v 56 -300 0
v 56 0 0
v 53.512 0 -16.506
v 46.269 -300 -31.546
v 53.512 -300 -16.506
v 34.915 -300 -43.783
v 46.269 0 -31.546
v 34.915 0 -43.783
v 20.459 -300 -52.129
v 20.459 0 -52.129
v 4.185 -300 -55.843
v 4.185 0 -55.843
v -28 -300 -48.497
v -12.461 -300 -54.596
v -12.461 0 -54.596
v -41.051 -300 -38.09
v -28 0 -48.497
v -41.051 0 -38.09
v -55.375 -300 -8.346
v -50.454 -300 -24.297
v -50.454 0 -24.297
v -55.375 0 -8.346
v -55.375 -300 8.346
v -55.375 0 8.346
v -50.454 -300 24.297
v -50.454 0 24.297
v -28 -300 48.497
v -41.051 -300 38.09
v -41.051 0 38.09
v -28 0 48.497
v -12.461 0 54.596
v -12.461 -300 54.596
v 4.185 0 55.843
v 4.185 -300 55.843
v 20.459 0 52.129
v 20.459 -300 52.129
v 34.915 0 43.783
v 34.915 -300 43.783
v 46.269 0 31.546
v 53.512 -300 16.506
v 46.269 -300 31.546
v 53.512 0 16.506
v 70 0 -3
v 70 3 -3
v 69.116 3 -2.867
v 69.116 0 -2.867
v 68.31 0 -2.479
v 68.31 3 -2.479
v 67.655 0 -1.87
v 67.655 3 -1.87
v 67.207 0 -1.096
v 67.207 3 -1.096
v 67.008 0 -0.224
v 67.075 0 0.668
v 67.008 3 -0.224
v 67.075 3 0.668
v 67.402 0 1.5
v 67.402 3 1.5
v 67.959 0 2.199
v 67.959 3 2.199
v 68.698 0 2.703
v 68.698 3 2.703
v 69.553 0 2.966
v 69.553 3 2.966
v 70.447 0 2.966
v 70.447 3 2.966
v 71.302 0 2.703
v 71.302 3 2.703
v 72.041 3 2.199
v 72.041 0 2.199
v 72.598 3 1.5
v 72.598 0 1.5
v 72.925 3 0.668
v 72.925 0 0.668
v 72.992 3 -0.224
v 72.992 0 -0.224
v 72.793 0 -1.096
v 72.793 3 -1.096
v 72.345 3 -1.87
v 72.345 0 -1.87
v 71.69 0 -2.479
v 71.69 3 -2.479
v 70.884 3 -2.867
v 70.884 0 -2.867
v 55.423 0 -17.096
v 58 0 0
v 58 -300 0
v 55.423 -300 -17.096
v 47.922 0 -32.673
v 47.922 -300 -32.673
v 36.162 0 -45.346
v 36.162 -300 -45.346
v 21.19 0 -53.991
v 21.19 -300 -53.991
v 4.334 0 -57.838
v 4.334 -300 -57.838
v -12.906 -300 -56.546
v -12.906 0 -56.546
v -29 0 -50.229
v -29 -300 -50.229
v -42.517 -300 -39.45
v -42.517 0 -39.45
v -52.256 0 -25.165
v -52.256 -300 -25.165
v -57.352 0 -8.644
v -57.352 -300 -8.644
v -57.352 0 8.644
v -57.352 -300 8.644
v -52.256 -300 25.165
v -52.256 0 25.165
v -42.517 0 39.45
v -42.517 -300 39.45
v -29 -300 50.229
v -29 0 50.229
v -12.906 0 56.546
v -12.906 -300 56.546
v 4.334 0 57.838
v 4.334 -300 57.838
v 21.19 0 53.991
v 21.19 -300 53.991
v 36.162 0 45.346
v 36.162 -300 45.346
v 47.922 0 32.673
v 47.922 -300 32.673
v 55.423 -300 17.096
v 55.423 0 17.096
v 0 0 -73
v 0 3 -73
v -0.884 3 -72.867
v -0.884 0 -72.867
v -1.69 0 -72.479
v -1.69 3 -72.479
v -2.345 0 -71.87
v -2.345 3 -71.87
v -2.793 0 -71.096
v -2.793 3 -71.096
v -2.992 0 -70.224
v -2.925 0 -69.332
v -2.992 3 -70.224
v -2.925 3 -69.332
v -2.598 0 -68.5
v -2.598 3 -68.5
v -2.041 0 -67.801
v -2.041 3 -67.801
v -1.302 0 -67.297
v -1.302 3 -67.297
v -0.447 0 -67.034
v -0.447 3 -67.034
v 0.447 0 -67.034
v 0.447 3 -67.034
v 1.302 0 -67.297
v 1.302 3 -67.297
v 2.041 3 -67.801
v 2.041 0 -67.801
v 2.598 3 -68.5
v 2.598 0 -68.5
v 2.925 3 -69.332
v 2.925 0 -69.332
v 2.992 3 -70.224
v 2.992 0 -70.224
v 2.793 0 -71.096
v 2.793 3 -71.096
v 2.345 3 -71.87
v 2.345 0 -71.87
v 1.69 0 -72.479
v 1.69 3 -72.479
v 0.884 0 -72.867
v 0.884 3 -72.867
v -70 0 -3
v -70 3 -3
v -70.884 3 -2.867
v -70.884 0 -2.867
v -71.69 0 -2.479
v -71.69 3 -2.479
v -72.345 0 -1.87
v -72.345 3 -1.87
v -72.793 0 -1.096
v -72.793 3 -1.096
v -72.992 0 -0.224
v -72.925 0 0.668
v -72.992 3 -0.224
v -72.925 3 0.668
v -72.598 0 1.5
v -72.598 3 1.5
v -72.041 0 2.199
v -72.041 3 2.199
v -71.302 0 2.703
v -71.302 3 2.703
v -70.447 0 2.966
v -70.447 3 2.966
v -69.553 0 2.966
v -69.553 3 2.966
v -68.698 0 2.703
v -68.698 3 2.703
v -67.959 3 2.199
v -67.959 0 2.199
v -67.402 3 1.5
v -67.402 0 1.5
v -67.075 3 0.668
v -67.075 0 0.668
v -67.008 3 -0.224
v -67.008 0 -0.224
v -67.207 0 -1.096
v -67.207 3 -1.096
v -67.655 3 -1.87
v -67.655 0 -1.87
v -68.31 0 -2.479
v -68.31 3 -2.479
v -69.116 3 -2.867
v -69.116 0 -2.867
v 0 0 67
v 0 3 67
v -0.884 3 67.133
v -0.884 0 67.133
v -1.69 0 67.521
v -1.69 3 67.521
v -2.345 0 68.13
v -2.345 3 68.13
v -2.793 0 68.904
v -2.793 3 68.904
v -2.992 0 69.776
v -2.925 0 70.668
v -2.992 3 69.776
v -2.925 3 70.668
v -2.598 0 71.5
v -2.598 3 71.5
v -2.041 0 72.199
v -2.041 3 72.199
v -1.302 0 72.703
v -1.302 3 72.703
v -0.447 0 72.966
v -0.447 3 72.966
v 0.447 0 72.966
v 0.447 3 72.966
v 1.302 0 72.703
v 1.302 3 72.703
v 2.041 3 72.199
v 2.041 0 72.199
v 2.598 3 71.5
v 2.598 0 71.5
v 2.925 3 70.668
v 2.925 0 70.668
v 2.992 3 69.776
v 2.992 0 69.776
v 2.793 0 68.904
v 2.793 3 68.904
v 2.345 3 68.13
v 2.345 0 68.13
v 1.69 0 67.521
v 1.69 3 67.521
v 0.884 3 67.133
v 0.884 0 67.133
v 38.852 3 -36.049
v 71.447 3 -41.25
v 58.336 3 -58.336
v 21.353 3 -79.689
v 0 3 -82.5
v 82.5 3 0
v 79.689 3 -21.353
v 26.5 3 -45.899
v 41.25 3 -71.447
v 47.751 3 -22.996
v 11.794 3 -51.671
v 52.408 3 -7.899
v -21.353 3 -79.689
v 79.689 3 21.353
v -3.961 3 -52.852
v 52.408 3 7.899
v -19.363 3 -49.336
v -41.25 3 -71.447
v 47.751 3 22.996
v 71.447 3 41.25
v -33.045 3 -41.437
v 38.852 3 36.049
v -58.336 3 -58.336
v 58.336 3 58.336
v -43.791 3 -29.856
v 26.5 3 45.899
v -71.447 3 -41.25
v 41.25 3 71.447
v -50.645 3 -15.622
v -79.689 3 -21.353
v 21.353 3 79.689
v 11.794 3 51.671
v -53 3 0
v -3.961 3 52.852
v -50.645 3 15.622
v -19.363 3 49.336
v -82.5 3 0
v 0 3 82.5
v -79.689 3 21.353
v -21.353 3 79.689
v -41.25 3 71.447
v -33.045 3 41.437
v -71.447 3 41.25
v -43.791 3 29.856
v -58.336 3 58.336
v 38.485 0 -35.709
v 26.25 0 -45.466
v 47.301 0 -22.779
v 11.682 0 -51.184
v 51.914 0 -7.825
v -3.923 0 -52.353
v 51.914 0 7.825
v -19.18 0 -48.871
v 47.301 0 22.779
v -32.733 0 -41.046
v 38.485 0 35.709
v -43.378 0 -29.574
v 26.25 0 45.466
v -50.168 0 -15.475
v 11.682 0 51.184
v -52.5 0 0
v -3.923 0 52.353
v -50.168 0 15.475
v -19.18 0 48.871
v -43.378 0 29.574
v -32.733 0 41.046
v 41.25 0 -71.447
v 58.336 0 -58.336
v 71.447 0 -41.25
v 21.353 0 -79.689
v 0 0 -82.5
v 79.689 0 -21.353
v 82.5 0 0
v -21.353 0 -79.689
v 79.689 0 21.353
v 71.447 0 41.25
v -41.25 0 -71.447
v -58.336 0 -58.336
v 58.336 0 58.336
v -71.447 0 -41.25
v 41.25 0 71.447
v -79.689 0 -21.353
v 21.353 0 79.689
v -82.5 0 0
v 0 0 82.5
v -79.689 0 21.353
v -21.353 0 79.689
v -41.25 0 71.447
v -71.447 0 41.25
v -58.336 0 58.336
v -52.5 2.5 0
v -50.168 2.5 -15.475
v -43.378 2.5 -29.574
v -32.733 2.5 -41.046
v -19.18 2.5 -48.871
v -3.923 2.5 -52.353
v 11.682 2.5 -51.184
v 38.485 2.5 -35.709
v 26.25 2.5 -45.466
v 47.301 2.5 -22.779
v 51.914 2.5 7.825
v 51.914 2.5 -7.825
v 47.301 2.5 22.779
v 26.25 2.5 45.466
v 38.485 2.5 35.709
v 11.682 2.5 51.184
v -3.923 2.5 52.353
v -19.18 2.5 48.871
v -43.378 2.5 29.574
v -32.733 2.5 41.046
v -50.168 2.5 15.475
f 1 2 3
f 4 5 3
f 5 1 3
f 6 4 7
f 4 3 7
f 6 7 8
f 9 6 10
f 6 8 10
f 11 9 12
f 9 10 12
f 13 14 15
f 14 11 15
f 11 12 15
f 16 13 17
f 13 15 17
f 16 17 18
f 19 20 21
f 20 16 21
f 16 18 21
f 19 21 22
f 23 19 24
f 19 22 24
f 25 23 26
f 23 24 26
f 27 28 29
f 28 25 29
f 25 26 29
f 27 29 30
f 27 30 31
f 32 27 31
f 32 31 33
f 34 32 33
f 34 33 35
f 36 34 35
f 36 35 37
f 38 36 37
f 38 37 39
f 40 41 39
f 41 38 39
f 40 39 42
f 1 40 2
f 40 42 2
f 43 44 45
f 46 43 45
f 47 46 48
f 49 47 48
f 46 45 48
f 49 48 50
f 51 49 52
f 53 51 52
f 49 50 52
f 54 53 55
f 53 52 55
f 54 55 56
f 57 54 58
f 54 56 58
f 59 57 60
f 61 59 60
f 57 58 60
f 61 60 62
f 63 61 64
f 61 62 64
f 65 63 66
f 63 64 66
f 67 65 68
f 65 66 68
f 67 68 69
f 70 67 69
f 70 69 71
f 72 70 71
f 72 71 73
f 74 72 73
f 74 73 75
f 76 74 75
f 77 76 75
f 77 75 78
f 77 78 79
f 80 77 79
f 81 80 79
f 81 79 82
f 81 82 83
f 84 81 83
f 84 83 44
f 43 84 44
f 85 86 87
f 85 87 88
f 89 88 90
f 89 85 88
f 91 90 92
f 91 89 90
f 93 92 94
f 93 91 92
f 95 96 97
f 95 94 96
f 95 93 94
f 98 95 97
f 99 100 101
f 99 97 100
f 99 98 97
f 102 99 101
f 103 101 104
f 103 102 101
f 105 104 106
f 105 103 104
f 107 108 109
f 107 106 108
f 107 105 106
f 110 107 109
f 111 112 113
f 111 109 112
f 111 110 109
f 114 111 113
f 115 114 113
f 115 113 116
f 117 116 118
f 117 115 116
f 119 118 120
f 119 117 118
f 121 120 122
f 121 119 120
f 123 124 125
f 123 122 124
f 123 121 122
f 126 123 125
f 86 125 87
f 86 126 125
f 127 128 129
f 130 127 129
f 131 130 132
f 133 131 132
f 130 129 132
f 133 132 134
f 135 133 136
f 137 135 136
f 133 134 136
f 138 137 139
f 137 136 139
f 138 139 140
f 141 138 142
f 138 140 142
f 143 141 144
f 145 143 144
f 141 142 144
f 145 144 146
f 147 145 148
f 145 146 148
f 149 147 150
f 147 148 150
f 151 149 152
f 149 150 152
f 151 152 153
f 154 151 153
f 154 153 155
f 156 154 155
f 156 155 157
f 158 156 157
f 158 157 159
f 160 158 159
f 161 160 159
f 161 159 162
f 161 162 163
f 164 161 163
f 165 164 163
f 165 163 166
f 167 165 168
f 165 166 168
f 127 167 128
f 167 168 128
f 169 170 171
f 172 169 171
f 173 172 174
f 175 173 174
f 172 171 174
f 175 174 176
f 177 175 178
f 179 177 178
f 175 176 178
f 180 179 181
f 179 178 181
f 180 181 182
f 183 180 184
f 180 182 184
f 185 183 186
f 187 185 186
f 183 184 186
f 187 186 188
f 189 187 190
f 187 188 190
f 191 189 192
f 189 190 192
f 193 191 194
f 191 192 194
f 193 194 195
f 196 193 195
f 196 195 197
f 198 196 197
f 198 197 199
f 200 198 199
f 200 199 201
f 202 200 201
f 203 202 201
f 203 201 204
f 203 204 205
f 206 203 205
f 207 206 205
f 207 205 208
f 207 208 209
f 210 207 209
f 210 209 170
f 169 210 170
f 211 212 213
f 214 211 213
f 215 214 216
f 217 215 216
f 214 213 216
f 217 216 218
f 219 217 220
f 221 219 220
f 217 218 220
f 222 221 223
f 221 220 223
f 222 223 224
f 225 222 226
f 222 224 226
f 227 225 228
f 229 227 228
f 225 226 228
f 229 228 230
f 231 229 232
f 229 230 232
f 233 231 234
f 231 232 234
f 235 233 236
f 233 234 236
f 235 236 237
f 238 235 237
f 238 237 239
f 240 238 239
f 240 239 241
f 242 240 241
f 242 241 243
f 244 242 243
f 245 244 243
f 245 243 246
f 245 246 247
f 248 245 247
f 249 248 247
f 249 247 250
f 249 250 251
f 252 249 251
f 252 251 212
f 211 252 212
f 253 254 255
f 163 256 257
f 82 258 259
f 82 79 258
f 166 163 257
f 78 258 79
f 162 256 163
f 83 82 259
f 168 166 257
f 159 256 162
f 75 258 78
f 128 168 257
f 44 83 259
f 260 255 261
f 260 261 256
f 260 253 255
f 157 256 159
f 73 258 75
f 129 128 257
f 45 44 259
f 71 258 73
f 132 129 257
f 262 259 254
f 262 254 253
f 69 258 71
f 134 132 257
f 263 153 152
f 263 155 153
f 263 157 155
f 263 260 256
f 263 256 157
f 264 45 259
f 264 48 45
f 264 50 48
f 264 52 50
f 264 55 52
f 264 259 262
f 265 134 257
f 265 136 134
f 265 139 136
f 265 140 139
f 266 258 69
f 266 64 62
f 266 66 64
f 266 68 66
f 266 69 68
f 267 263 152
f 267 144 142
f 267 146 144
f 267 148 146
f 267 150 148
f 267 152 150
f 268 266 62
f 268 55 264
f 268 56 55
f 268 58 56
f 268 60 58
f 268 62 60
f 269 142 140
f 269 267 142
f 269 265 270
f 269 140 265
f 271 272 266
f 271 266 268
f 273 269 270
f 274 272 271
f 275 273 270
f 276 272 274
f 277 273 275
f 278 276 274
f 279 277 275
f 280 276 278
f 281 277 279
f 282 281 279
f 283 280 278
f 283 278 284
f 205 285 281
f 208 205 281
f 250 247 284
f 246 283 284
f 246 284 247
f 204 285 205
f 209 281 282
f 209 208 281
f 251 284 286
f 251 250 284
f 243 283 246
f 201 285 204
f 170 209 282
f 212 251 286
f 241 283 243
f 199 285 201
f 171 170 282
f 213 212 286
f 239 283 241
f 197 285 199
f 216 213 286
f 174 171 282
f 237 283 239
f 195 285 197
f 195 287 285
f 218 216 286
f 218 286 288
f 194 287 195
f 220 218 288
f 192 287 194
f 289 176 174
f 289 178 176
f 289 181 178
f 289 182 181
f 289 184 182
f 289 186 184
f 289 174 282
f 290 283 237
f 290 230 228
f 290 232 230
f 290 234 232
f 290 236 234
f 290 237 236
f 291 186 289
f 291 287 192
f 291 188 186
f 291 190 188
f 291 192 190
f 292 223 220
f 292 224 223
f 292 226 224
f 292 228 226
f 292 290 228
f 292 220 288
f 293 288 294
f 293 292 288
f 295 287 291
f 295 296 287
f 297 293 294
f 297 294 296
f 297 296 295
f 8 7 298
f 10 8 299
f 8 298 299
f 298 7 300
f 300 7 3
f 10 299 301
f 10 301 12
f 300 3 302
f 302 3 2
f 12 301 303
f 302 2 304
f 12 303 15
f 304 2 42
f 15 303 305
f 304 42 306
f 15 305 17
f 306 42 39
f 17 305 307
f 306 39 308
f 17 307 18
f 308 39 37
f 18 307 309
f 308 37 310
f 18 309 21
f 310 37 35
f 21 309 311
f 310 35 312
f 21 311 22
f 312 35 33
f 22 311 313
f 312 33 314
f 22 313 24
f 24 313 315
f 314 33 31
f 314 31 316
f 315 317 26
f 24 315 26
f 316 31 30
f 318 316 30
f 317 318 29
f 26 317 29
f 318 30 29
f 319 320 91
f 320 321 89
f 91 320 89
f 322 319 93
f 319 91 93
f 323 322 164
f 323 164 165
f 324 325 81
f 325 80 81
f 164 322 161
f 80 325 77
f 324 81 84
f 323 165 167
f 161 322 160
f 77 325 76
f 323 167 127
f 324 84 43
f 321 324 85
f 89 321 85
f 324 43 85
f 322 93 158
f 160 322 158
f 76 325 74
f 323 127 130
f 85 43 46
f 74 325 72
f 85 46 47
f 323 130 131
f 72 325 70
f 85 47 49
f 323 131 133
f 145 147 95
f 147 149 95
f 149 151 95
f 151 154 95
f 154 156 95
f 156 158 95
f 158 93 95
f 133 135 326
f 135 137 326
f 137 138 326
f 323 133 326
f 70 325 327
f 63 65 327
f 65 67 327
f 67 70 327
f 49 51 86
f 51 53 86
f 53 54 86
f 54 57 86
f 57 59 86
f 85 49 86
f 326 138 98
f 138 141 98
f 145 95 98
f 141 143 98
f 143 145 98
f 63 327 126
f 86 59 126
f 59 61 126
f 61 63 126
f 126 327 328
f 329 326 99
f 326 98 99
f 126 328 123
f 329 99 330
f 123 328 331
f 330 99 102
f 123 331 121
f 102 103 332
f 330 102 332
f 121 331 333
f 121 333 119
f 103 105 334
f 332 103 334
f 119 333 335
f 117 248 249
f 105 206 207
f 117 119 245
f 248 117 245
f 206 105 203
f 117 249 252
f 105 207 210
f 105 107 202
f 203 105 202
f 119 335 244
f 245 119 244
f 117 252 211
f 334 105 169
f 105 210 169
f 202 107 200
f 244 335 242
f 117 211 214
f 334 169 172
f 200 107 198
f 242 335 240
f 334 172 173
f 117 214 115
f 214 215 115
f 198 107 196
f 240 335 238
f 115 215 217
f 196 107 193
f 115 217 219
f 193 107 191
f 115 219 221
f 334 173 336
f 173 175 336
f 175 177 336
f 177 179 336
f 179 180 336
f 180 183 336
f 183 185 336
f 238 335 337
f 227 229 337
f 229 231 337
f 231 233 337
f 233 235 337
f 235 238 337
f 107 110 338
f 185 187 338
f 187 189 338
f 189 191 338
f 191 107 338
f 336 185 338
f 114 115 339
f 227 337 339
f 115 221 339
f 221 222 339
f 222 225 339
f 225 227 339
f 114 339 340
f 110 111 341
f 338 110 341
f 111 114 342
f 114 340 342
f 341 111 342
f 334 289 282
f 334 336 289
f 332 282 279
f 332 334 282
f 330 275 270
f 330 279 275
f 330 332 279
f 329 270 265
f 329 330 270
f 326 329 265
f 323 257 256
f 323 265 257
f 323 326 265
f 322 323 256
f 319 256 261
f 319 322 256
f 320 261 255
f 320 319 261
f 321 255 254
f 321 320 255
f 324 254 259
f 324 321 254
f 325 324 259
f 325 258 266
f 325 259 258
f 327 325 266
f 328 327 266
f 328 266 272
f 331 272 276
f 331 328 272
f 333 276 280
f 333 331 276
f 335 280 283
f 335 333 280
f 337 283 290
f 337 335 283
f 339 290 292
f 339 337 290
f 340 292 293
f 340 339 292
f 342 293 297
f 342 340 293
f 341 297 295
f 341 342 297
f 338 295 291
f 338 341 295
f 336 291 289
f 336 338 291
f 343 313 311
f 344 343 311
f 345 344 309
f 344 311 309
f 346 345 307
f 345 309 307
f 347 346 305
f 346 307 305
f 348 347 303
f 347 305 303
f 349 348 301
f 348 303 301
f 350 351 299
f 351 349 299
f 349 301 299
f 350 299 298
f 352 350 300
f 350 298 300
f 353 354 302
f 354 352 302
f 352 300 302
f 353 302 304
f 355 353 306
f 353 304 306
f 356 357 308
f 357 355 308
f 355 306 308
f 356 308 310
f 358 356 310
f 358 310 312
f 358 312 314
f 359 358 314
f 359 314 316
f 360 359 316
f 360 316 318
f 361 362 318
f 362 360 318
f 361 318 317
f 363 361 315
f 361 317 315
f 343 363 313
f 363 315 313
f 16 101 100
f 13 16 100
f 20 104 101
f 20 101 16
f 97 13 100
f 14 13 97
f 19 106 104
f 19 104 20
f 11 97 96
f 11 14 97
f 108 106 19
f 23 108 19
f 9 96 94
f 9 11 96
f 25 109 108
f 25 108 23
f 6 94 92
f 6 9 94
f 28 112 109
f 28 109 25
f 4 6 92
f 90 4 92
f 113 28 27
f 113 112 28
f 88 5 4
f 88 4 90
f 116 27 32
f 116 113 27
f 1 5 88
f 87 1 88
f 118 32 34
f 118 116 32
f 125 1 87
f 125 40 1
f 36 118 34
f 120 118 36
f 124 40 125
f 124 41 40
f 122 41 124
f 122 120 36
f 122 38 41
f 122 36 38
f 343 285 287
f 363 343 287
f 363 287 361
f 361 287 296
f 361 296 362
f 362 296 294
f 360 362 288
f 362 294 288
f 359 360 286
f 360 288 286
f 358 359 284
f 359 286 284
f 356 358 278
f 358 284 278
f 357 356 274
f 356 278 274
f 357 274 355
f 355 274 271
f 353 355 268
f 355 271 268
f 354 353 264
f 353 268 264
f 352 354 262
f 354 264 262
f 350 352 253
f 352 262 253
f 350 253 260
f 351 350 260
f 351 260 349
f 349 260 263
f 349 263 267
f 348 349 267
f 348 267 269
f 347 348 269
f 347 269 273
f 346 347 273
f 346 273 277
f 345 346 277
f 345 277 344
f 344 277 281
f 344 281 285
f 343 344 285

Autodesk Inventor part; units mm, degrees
ref_plane "YZ Plane" through (0, 0, 0) normal (1, 0, 0) x (0, 1, 0)
ref_plane "XZ Plane" through (0, 0, 0) normal (0, 1, 0) x (-1, 0, 0)
ref_plane "XY Plane" through (0, 0, 0) normal (0, 0, 1) x (1, 0, 0)
sketch "Sketch1" plane through (0, 0, 0) normal (0, 1, 0) x (-1, 0, 0)
  circle A0 centre (0, 0) radius 52.5
  circle A1 centre (0, 0) radius 82.5
  dimension "d1" = 105
  dimension "d2" = 30
extrude "Extrusion1" add sketch "Sketch1" along normal blind 3
chamfer "Chamfer1" distance 0.5 angle 45 1 edges at (52.5, 3, 0)
sketch "Sketch4" plane through (0, 0, 0) normal (0, -1, 0) x (1, 0, 0)
  circle A0 centre (0, 0) radius 70 construction
  circle A1 centre (0, 70) radius 3
  circle A2 centre (-70, 0) radius 3
  circle A3 centre (0, -70) radius 3
  circle A4 centre (70, 0) radius 3
  dimension "d14" = 140
  dimension "d15" = 6
  dimension "d18" = 360
hole "Hole1" at (0, 0, 70) at (70, 0, 0) at (0, 0, -70) at (-70, 0, 0) direction (0, 1, 0) diameter 6 end through all
sketch "Sketch5" plane through (0, 0, 0) normal (0, -1, 0) x (1, 0, 0)
  circle A0 centre (0, 0) radius 56
  circle A1 centre (0, 0) radius 58
  dimension "d28" = 112
  dimension "d29" = 116
extrude "Extrusion3" add sketch "Sketch5" along normal blind 300
properties part number "110mm_flange"
